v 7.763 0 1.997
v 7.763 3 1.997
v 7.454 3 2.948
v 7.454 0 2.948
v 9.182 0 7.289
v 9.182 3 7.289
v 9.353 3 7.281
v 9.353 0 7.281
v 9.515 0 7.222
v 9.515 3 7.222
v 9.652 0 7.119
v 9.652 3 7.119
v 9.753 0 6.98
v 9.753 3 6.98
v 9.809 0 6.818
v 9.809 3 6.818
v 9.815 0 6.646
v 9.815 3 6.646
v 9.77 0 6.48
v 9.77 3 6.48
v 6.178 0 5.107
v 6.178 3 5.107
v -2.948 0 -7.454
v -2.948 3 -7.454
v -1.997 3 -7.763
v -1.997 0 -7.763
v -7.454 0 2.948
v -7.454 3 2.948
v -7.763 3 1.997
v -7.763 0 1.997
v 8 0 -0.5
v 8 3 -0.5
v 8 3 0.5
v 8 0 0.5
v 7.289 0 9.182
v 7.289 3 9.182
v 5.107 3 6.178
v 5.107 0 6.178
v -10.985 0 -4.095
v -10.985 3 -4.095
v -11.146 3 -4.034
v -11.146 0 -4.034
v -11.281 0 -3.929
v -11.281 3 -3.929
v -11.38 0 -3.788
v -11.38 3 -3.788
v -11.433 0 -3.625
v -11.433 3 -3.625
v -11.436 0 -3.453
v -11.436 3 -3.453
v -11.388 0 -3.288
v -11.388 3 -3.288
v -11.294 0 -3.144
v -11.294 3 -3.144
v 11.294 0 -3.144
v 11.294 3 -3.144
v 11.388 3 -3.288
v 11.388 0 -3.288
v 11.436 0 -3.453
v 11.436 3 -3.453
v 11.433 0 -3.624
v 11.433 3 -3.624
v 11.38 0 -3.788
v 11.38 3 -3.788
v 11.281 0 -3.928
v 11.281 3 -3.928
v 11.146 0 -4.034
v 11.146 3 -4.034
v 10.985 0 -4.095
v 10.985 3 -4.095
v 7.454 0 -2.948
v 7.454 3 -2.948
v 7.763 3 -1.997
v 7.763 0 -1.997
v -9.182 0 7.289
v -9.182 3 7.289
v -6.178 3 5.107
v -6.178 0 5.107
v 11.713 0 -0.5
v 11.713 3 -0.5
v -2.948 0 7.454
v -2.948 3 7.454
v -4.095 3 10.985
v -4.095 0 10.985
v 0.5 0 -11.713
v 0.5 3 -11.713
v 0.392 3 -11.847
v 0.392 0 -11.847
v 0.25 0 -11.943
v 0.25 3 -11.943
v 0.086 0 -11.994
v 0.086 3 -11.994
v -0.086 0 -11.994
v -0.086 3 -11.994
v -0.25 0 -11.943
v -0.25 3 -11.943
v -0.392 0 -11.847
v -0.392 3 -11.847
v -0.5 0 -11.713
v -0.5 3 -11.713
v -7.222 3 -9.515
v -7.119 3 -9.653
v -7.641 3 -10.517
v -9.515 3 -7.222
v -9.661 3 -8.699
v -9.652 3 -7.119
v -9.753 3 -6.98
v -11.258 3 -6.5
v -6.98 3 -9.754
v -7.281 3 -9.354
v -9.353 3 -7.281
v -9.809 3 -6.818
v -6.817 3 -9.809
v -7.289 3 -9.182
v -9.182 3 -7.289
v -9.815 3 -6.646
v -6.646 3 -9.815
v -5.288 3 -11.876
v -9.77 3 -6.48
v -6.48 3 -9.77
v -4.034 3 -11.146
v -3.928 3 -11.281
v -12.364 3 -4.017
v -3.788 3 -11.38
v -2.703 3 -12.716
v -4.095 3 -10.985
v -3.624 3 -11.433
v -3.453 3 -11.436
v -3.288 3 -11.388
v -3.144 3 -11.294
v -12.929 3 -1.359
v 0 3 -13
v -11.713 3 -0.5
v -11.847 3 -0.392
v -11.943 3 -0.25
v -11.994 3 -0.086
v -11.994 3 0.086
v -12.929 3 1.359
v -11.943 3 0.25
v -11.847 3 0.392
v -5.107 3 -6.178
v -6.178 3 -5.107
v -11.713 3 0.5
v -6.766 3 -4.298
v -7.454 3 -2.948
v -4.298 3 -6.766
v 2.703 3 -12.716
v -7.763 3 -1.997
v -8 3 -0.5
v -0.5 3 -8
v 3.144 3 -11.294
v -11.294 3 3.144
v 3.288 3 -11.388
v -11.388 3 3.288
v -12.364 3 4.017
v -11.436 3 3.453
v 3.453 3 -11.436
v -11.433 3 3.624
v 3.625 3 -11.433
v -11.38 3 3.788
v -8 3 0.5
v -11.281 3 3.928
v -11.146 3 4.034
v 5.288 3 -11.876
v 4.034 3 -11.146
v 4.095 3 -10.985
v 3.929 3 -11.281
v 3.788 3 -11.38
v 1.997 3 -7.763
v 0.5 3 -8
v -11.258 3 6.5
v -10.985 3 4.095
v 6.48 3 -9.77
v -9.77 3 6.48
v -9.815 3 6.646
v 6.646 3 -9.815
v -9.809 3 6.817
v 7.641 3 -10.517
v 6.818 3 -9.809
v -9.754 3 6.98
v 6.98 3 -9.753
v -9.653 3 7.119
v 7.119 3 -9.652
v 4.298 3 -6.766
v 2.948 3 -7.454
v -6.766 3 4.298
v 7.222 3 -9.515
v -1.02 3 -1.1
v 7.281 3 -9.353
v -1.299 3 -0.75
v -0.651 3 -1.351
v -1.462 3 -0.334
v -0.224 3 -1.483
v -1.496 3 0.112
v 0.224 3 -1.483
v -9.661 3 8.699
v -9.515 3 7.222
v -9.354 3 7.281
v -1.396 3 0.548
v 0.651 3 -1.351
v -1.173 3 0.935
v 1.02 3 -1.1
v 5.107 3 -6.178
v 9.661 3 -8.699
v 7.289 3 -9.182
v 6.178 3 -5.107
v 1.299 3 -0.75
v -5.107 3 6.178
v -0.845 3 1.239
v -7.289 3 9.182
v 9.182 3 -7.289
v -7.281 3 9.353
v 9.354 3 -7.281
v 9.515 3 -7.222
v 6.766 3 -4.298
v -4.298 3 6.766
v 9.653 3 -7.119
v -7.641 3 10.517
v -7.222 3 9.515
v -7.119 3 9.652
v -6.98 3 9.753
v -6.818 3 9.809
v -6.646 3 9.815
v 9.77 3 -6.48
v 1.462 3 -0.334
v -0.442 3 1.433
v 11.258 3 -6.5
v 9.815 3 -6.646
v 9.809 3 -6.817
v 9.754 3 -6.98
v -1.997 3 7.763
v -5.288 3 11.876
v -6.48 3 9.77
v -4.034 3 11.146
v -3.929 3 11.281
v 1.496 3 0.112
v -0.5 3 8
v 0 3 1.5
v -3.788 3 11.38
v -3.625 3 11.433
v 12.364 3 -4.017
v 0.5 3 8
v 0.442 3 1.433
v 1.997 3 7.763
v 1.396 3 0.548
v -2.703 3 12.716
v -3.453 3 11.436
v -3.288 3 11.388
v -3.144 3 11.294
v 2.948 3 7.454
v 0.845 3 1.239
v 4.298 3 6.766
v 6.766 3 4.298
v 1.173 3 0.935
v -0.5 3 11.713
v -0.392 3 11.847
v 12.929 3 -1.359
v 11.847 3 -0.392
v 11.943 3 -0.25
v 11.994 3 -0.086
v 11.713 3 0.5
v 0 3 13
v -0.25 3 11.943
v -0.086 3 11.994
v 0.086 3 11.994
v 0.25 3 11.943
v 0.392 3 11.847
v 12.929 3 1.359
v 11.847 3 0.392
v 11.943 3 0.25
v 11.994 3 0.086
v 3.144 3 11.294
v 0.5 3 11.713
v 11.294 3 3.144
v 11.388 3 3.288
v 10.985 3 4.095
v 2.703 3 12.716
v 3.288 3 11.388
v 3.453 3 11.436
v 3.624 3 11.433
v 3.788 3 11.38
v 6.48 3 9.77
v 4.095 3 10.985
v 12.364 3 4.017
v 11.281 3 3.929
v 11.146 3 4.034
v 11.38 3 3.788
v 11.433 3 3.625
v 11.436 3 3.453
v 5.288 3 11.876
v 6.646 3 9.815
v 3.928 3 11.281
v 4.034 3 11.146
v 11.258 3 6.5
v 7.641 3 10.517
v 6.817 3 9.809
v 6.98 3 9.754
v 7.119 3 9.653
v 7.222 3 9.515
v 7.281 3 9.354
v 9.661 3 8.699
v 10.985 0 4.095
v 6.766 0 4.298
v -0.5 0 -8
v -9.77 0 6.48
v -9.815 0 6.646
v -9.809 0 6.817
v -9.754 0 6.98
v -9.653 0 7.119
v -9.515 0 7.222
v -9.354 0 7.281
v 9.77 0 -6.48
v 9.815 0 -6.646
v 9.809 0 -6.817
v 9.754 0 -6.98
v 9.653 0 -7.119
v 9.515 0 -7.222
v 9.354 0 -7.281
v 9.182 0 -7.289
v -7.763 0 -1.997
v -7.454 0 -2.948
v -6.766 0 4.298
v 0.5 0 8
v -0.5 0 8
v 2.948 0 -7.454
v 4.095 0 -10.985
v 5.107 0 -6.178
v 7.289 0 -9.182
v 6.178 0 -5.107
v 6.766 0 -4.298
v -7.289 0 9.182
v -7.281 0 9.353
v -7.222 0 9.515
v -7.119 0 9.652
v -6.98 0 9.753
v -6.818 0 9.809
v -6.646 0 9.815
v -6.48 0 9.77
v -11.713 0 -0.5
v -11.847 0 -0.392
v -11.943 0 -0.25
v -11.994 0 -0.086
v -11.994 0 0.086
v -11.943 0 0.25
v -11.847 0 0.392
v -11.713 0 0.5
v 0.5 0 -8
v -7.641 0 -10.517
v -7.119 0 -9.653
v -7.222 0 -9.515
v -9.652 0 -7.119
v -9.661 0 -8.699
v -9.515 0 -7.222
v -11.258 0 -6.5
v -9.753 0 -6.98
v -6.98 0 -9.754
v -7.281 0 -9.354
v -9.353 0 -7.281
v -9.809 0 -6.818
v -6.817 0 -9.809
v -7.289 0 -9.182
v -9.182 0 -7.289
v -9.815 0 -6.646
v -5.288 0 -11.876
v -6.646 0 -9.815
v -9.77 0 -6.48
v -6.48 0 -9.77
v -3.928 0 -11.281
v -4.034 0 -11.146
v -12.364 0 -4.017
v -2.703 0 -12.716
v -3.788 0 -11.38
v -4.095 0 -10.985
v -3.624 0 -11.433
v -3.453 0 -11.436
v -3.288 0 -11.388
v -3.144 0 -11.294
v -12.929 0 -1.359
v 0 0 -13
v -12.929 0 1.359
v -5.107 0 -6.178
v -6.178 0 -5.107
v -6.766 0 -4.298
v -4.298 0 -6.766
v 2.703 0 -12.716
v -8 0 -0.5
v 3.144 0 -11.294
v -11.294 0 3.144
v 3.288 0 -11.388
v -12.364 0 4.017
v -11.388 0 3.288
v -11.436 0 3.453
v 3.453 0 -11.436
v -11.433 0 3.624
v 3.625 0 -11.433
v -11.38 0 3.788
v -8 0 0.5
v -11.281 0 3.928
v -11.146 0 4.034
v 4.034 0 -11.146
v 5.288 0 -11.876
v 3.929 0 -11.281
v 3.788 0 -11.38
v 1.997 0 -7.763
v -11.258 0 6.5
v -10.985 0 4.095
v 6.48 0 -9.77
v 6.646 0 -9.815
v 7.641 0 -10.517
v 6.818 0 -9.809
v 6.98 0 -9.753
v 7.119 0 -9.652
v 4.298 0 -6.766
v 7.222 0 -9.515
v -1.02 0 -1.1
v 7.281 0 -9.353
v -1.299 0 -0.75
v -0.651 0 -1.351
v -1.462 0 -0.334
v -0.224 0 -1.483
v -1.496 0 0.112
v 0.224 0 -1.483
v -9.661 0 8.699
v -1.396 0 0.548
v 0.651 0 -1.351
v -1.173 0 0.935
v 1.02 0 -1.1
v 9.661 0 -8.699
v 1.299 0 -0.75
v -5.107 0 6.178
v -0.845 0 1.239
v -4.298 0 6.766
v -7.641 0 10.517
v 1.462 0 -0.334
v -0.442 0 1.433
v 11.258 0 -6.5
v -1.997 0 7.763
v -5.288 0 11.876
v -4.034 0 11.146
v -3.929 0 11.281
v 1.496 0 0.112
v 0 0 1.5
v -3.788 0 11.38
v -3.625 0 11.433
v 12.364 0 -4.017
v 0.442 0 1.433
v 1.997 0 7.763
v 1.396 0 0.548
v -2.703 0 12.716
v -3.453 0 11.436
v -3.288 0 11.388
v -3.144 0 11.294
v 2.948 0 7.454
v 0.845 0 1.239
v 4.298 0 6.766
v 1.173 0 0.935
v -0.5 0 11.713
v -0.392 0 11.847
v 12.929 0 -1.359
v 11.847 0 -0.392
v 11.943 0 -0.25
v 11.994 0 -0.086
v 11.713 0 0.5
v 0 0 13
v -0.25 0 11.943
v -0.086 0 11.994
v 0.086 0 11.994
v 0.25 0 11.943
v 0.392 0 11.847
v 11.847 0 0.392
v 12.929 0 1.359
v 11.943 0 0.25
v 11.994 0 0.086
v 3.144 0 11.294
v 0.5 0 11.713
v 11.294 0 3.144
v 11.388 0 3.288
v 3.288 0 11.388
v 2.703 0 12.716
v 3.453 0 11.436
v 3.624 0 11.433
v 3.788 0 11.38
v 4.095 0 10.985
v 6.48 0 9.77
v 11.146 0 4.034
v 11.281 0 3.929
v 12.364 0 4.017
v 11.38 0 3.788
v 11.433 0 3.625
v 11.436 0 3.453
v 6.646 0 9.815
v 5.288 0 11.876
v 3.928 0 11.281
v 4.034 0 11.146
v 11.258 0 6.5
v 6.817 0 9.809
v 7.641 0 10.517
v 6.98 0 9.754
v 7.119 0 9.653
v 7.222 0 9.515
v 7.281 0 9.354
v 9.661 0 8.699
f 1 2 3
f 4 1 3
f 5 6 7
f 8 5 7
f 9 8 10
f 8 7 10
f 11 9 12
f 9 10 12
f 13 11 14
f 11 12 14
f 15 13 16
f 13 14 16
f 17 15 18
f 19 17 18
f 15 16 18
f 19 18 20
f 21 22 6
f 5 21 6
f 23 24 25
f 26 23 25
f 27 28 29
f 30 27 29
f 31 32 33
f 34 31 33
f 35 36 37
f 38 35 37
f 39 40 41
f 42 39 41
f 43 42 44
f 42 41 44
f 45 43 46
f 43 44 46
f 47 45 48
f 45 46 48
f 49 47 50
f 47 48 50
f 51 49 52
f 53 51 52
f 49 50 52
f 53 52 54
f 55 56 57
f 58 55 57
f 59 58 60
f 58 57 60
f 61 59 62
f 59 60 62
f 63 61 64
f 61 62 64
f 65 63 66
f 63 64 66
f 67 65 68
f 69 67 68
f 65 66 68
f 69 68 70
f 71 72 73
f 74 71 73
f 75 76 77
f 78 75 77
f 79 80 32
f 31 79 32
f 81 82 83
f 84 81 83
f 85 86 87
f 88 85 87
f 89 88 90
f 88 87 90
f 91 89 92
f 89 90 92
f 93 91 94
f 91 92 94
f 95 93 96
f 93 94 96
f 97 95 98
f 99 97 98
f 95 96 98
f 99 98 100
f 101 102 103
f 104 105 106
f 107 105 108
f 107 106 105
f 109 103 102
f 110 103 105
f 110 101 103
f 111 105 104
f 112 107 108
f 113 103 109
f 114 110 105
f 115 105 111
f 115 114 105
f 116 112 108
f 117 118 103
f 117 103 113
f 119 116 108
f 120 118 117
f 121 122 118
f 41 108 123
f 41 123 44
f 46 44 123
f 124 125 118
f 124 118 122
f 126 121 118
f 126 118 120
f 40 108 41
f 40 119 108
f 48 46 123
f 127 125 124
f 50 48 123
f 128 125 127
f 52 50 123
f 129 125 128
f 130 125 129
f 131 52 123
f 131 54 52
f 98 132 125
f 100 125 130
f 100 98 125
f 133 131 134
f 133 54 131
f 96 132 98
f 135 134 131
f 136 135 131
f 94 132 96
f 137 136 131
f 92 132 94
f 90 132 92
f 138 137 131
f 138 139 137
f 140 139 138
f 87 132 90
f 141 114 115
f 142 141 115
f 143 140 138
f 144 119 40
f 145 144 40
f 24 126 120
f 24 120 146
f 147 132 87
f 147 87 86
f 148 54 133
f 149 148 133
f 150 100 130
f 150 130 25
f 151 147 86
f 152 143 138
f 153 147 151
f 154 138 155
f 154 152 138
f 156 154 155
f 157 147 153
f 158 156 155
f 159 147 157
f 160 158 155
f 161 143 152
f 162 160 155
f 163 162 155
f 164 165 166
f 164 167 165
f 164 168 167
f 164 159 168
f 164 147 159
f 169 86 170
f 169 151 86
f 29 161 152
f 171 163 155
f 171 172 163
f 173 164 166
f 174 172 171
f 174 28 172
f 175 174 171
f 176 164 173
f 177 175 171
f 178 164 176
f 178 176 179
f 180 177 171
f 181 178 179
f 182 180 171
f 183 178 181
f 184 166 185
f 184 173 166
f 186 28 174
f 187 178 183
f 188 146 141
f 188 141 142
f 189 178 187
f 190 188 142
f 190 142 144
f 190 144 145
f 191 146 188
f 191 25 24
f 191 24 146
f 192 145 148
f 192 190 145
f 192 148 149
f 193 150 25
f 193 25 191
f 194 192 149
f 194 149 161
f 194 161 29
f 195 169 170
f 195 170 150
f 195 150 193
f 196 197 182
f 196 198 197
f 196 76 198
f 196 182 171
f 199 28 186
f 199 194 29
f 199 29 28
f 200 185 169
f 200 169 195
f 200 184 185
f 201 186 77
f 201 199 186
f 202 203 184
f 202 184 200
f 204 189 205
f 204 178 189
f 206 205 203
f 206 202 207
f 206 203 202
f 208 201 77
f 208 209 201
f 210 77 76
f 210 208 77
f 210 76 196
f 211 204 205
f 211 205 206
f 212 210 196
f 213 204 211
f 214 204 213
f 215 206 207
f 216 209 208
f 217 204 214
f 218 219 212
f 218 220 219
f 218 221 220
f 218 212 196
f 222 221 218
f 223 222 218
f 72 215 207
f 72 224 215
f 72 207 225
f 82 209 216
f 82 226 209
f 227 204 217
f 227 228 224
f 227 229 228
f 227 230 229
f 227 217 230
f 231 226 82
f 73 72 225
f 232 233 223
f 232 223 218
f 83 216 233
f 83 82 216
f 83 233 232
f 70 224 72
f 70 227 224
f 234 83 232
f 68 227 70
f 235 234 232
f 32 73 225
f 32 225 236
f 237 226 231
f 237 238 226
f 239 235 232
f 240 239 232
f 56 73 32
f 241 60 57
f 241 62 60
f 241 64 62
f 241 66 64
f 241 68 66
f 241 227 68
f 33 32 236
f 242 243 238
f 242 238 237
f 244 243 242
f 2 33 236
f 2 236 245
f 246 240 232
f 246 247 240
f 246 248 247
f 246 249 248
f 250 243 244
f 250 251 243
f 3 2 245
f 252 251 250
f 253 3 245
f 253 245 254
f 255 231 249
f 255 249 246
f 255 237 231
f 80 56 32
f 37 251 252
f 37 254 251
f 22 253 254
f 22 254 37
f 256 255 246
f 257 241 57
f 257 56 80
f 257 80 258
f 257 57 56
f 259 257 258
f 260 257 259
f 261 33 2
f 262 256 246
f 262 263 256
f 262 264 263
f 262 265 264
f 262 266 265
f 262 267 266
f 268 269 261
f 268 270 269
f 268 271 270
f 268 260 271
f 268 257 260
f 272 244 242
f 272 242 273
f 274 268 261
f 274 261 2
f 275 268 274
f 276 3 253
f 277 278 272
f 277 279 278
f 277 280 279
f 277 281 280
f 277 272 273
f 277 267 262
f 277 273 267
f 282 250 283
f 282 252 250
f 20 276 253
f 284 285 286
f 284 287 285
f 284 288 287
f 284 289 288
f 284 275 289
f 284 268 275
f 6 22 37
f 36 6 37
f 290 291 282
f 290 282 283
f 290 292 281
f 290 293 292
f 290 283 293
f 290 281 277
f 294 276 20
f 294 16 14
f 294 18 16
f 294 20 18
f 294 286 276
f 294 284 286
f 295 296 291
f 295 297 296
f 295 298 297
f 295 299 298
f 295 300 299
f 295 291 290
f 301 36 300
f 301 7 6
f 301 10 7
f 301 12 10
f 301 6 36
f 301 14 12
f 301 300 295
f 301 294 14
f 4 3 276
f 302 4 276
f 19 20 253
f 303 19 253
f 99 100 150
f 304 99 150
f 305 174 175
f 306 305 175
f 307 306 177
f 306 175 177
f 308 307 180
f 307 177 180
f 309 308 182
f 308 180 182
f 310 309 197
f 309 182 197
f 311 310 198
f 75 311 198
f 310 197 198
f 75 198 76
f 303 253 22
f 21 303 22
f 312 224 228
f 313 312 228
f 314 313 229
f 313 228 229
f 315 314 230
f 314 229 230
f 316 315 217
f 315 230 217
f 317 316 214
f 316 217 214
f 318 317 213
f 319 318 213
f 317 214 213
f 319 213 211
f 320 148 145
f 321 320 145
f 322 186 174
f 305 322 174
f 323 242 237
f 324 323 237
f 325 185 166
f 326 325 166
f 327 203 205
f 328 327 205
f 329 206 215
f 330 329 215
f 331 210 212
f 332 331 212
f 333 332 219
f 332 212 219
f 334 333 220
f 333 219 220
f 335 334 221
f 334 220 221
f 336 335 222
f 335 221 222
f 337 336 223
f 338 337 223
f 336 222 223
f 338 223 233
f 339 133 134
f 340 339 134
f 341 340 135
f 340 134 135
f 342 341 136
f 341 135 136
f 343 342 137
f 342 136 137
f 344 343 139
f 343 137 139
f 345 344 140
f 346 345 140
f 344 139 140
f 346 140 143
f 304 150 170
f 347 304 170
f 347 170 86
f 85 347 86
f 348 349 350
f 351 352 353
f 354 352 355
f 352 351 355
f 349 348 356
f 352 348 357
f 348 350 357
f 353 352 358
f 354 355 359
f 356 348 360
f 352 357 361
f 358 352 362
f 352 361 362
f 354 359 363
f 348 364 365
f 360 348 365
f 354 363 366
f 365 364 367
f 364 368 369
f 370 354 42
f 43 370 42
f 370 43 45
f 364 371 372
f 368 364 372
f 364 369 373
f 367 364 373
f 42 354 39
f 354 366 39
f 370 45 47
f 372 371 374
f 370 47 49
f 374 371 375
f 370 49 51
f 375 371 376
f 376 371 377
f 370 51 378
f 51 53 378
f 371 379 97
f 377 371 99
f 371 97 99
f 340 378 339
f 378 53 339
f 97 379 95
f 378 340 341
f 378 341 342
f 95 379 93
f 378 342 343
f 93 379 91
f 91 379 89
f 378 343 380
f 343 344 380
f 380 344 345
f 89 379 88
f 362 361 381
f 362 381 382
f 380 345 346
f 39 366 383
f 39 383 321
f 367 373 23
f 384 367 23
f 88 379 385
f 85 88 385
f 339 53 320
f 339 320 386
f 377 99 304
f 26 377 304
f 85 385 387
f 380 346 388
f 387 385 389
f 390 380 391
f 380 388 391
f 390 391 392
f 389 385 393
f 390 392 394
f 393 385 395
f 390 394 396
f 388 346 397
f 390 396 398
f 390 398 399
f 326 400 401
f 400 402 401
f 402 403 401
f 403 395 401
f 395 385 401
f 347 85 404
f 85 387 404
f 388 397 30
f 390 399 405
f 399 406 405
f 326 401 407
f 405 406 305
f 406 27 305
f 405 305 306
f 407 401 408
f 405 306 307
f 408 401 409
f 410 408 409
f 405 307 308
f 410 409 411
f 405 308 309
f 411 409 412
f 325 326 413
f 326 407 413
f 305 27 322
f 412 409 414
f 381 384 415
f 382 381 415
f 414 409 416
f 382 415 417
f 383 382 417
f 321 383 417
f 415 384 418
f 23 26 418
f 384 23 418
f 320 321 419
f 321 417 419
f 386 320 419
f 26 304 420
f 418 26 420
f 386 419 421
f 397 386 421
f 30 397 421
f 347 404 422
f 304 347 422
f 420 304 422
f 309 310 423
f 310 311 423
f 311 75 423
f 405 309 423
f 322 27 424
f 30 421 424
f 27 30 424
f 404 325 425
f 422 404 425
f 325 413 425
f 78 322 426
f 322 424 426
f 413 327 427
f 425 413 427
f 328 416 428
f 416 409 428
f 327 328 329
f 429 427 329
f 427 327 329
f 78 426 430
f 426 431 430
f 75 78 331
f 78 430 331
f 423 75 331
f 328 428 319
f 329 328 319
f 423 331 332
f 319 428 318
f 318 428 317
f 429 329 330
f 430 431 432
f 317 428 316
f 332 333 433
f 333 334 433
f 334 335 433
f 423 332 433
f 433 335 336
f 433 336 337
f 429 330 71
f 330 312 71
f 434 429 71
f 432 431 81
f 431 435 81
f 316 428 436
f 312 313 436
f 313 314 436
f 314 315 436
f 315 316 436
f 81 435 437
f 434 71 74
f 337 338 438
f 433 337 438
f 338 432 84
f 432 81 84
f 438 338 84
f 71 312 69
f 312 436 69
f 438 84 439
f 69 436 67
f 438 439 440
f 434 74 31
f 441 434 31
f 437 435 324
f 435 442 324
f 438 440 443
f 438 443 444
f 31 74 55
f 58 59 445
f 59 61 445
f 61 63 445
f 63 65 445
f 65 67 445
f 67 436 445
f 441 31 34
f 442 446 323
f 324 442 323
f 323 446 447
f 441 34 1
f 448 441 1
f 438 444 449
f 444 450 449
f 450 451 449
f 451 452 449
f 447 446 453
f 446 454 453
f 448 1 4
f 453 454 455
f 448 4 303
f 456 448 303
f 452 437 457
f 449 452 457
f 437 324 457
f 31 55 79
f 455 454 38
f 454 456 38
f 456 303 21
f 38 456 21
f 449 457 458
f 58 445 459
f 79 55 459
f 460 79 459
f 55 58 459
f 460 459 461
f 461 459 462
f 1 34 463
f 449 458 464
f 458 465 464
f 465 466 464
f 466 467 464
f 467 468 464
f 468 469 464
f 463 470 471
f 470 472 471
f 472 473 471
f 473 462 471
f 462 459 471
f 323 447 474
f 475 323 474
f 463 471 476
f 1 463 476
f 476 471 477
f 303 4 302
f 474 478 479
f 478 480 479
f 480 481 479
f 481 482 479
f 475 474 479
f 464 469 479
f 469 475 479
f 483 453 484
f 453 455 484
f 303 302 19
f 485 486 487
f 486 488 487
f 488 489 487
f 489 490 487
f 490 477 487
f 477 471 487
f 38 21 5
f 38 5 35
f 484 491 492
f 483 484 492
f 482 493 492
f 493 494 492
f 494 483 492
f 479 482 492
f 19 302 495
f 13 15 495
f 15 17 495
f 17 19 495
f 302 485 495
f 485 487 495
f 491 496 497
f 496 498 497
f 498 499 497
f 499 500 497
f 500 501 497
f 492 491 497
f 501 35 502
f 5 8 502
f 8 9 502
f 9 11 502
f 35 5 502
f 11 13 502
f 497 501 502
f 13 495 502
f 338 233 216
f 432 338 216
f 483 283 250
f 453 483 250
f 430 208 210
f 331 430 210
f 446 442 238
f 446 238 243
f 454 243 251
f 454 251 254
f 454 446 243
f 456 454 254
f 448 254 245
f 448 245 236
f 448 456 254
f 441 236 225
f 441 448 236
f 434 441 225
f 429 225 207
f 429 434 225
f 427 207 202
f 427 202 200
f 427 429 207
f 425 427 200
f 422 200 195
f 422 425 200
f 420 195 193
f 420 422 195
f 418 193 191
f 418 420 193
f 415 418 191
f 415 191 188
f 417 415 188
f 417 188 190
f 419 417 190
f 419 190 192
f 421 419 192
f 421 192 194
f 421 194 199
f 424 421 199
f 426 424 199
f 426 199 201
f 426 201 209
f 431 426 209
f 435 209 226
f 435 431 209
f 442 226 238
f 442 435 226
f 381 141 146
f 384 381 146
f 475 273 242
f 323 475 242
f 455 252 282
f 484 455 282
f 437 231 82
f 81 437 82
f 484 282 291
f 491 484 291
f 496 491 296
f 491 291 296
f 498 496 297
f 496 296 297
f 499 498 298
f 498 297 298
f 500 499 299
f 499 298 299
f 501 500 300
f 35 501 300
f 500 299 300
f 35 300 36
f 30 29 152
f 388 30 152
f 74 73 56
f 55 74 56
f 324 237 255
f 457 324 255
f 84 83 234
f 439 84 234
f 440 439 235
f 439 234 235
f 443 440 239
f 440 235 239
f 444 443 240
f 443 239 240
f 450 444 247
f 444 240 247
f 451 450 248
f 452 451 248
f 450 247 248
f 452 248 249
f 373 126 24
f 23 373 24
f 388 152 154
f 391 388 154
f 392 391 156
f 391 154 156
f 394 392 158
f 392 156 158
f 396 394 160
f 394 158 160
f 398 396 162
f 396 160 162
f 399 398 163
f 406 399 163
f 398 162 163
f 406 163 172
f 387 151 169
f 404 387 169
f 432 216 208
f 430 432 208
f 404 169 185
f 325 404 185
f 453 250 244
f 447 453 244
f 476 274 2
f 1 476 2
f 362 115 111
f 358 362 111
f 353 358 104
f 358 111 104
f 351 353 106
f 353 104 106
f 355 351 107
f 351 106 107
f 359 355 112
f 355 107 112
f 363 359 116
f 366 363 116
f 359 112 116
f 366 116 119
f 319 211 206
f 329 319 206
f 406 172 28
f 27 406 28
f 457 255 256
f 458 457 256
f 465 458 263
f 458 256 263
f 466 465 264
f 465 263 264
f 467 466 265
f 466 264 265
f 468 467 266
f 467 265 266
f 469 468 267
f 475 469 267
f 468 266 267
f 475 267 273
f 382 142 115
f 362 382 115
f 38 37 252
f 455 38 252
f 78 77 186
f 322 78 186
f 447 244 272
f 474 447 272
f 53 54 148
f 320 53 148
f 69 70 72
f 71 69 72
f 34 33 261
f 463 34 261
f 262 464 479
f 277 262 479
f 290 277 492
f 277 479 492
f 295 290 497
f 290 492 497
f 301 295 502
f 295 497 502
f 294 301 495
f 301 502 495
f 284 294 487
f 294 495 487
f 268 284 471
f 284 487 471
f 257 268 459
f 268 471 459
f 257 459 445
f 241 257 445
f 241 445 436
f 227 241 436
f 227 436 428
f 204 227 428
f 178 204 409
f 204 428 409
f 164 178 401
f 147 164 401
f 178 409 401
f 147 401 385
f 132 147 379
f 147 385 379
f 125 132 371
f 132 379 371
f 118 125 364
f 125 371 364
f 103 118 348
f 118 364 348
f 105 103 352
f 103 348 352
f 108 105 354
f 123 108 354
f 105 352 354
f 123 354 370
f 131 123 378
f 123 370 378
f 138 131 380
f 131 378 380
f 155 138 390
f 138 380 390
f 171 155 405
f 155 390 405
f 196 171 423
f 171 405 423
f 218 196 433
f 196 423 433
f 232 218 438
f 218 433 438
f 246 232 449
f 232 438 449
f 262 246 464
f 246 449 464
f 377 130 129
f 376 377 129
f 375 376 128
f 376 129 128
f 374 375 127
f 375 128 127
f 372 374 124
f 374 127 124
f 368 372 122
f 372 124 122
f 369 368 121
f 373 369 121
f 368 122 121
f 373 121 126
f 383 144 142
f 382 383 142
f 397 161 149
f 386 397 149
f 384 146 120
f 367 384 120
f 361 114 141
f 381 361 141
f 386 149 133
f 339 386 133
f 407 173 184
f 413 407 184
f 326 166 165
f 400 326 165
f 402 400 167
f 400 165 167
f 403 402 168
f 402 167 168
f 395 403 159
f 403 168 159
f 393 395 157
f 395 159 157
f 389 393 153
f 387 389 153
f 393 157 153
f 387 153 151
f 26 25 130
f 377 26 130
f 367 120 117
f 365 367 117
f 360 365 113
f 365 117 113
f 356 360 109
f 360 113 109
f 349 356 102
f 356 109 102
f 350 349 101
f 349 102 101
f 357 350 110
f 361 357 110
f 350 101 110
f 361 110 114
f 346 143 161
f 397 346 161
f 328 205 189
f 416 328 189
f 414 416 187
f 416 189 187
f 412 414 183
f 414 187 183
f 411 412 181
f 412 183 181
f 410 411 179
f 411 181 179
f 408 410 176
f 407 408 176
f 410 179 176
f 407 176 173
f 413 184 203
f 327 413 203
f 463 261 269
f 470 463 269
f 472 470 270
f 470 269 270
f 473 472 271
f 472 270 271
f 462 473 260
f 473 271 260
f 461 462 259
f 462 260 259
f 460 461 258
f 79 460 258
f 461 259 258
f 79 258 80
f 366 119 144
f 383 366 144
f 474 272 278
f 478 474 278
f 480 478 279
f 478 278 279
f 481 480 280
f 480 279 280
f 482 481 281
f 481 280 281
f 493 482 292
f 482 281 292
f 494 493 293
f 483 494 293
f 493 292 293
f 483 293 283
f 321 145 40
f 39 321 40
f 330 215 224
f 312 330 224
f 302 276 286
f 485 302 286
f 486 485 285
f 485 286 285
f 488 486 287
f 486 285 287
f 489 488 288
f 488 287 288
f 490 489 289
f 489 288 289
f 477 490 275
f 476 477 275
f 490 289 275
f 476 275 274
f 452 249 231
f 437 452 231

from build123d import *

# Parameters (mm, degrees)
CROQUIS1_R              = 13
CROQUIS1_R_2            = 1.5
SALIENTE_EXTRUIR1_DEPTH = 3
CORTAR_EXTRUIR1_DEPTH   = 3
MATRIZC1_COUNT          = 20


with BuildPart() as part:
    # Croquis1 → Saliente-Extruir1 (new body)
    with BuildSketch(Plane(origin=(0, 0, 0), x_dir=(1, 0, 0), z_dir=(0, 1, 0))):
        with Locations(Location((0, 0, 0), (0, 0, 270))):
            Circle(CROQUIS1_R)
        with Locations(Location((0, 0, 0), (0, 0, 270))):
            Circle(CROQUIS1_R_2, mode=Mode.SUBTRACT)
    extrude(amount=SALIENTE_EXTRUIR1_DEPTH)

    # Croquis2 → Cortar-Extruir1 (cut)
    with BuildSketch(Plane(origin=(0, 3, 0), x_dir=(1, 0, 0), z_dir=(0, 1, 0))):
        with BuildLine():
            Line((-0.5, 8), (0.5, 8))
            Line((0.5, 8), (0.5, 11.712659584))
            ThreePointArc((0.5, 11.712659584), (0.000139252, 12), (-0.5, 11.713144616))
            Line((-0.5, 11.713144616), (-0.5, 8))
        make_face()
    cortar_extruir1 = extrude(amount=-CORTAR_EXTRUIR1_DEPTH, mode=Mode.SUBTRACT)

    # MatrizC1: Cortar-Extruir1 ×20 about axis
    matrizc1_axis = Axis((0, 0, 0), (0, 1, 0))
    for i in range(1, MATRIZC1_COUNT):
        add(cortar_extruir1.rotate(matrizc1_axis, i * 360 / MATRIZC1_COUNT), mode=Mode.SUBTRACT)


solid = part.part
